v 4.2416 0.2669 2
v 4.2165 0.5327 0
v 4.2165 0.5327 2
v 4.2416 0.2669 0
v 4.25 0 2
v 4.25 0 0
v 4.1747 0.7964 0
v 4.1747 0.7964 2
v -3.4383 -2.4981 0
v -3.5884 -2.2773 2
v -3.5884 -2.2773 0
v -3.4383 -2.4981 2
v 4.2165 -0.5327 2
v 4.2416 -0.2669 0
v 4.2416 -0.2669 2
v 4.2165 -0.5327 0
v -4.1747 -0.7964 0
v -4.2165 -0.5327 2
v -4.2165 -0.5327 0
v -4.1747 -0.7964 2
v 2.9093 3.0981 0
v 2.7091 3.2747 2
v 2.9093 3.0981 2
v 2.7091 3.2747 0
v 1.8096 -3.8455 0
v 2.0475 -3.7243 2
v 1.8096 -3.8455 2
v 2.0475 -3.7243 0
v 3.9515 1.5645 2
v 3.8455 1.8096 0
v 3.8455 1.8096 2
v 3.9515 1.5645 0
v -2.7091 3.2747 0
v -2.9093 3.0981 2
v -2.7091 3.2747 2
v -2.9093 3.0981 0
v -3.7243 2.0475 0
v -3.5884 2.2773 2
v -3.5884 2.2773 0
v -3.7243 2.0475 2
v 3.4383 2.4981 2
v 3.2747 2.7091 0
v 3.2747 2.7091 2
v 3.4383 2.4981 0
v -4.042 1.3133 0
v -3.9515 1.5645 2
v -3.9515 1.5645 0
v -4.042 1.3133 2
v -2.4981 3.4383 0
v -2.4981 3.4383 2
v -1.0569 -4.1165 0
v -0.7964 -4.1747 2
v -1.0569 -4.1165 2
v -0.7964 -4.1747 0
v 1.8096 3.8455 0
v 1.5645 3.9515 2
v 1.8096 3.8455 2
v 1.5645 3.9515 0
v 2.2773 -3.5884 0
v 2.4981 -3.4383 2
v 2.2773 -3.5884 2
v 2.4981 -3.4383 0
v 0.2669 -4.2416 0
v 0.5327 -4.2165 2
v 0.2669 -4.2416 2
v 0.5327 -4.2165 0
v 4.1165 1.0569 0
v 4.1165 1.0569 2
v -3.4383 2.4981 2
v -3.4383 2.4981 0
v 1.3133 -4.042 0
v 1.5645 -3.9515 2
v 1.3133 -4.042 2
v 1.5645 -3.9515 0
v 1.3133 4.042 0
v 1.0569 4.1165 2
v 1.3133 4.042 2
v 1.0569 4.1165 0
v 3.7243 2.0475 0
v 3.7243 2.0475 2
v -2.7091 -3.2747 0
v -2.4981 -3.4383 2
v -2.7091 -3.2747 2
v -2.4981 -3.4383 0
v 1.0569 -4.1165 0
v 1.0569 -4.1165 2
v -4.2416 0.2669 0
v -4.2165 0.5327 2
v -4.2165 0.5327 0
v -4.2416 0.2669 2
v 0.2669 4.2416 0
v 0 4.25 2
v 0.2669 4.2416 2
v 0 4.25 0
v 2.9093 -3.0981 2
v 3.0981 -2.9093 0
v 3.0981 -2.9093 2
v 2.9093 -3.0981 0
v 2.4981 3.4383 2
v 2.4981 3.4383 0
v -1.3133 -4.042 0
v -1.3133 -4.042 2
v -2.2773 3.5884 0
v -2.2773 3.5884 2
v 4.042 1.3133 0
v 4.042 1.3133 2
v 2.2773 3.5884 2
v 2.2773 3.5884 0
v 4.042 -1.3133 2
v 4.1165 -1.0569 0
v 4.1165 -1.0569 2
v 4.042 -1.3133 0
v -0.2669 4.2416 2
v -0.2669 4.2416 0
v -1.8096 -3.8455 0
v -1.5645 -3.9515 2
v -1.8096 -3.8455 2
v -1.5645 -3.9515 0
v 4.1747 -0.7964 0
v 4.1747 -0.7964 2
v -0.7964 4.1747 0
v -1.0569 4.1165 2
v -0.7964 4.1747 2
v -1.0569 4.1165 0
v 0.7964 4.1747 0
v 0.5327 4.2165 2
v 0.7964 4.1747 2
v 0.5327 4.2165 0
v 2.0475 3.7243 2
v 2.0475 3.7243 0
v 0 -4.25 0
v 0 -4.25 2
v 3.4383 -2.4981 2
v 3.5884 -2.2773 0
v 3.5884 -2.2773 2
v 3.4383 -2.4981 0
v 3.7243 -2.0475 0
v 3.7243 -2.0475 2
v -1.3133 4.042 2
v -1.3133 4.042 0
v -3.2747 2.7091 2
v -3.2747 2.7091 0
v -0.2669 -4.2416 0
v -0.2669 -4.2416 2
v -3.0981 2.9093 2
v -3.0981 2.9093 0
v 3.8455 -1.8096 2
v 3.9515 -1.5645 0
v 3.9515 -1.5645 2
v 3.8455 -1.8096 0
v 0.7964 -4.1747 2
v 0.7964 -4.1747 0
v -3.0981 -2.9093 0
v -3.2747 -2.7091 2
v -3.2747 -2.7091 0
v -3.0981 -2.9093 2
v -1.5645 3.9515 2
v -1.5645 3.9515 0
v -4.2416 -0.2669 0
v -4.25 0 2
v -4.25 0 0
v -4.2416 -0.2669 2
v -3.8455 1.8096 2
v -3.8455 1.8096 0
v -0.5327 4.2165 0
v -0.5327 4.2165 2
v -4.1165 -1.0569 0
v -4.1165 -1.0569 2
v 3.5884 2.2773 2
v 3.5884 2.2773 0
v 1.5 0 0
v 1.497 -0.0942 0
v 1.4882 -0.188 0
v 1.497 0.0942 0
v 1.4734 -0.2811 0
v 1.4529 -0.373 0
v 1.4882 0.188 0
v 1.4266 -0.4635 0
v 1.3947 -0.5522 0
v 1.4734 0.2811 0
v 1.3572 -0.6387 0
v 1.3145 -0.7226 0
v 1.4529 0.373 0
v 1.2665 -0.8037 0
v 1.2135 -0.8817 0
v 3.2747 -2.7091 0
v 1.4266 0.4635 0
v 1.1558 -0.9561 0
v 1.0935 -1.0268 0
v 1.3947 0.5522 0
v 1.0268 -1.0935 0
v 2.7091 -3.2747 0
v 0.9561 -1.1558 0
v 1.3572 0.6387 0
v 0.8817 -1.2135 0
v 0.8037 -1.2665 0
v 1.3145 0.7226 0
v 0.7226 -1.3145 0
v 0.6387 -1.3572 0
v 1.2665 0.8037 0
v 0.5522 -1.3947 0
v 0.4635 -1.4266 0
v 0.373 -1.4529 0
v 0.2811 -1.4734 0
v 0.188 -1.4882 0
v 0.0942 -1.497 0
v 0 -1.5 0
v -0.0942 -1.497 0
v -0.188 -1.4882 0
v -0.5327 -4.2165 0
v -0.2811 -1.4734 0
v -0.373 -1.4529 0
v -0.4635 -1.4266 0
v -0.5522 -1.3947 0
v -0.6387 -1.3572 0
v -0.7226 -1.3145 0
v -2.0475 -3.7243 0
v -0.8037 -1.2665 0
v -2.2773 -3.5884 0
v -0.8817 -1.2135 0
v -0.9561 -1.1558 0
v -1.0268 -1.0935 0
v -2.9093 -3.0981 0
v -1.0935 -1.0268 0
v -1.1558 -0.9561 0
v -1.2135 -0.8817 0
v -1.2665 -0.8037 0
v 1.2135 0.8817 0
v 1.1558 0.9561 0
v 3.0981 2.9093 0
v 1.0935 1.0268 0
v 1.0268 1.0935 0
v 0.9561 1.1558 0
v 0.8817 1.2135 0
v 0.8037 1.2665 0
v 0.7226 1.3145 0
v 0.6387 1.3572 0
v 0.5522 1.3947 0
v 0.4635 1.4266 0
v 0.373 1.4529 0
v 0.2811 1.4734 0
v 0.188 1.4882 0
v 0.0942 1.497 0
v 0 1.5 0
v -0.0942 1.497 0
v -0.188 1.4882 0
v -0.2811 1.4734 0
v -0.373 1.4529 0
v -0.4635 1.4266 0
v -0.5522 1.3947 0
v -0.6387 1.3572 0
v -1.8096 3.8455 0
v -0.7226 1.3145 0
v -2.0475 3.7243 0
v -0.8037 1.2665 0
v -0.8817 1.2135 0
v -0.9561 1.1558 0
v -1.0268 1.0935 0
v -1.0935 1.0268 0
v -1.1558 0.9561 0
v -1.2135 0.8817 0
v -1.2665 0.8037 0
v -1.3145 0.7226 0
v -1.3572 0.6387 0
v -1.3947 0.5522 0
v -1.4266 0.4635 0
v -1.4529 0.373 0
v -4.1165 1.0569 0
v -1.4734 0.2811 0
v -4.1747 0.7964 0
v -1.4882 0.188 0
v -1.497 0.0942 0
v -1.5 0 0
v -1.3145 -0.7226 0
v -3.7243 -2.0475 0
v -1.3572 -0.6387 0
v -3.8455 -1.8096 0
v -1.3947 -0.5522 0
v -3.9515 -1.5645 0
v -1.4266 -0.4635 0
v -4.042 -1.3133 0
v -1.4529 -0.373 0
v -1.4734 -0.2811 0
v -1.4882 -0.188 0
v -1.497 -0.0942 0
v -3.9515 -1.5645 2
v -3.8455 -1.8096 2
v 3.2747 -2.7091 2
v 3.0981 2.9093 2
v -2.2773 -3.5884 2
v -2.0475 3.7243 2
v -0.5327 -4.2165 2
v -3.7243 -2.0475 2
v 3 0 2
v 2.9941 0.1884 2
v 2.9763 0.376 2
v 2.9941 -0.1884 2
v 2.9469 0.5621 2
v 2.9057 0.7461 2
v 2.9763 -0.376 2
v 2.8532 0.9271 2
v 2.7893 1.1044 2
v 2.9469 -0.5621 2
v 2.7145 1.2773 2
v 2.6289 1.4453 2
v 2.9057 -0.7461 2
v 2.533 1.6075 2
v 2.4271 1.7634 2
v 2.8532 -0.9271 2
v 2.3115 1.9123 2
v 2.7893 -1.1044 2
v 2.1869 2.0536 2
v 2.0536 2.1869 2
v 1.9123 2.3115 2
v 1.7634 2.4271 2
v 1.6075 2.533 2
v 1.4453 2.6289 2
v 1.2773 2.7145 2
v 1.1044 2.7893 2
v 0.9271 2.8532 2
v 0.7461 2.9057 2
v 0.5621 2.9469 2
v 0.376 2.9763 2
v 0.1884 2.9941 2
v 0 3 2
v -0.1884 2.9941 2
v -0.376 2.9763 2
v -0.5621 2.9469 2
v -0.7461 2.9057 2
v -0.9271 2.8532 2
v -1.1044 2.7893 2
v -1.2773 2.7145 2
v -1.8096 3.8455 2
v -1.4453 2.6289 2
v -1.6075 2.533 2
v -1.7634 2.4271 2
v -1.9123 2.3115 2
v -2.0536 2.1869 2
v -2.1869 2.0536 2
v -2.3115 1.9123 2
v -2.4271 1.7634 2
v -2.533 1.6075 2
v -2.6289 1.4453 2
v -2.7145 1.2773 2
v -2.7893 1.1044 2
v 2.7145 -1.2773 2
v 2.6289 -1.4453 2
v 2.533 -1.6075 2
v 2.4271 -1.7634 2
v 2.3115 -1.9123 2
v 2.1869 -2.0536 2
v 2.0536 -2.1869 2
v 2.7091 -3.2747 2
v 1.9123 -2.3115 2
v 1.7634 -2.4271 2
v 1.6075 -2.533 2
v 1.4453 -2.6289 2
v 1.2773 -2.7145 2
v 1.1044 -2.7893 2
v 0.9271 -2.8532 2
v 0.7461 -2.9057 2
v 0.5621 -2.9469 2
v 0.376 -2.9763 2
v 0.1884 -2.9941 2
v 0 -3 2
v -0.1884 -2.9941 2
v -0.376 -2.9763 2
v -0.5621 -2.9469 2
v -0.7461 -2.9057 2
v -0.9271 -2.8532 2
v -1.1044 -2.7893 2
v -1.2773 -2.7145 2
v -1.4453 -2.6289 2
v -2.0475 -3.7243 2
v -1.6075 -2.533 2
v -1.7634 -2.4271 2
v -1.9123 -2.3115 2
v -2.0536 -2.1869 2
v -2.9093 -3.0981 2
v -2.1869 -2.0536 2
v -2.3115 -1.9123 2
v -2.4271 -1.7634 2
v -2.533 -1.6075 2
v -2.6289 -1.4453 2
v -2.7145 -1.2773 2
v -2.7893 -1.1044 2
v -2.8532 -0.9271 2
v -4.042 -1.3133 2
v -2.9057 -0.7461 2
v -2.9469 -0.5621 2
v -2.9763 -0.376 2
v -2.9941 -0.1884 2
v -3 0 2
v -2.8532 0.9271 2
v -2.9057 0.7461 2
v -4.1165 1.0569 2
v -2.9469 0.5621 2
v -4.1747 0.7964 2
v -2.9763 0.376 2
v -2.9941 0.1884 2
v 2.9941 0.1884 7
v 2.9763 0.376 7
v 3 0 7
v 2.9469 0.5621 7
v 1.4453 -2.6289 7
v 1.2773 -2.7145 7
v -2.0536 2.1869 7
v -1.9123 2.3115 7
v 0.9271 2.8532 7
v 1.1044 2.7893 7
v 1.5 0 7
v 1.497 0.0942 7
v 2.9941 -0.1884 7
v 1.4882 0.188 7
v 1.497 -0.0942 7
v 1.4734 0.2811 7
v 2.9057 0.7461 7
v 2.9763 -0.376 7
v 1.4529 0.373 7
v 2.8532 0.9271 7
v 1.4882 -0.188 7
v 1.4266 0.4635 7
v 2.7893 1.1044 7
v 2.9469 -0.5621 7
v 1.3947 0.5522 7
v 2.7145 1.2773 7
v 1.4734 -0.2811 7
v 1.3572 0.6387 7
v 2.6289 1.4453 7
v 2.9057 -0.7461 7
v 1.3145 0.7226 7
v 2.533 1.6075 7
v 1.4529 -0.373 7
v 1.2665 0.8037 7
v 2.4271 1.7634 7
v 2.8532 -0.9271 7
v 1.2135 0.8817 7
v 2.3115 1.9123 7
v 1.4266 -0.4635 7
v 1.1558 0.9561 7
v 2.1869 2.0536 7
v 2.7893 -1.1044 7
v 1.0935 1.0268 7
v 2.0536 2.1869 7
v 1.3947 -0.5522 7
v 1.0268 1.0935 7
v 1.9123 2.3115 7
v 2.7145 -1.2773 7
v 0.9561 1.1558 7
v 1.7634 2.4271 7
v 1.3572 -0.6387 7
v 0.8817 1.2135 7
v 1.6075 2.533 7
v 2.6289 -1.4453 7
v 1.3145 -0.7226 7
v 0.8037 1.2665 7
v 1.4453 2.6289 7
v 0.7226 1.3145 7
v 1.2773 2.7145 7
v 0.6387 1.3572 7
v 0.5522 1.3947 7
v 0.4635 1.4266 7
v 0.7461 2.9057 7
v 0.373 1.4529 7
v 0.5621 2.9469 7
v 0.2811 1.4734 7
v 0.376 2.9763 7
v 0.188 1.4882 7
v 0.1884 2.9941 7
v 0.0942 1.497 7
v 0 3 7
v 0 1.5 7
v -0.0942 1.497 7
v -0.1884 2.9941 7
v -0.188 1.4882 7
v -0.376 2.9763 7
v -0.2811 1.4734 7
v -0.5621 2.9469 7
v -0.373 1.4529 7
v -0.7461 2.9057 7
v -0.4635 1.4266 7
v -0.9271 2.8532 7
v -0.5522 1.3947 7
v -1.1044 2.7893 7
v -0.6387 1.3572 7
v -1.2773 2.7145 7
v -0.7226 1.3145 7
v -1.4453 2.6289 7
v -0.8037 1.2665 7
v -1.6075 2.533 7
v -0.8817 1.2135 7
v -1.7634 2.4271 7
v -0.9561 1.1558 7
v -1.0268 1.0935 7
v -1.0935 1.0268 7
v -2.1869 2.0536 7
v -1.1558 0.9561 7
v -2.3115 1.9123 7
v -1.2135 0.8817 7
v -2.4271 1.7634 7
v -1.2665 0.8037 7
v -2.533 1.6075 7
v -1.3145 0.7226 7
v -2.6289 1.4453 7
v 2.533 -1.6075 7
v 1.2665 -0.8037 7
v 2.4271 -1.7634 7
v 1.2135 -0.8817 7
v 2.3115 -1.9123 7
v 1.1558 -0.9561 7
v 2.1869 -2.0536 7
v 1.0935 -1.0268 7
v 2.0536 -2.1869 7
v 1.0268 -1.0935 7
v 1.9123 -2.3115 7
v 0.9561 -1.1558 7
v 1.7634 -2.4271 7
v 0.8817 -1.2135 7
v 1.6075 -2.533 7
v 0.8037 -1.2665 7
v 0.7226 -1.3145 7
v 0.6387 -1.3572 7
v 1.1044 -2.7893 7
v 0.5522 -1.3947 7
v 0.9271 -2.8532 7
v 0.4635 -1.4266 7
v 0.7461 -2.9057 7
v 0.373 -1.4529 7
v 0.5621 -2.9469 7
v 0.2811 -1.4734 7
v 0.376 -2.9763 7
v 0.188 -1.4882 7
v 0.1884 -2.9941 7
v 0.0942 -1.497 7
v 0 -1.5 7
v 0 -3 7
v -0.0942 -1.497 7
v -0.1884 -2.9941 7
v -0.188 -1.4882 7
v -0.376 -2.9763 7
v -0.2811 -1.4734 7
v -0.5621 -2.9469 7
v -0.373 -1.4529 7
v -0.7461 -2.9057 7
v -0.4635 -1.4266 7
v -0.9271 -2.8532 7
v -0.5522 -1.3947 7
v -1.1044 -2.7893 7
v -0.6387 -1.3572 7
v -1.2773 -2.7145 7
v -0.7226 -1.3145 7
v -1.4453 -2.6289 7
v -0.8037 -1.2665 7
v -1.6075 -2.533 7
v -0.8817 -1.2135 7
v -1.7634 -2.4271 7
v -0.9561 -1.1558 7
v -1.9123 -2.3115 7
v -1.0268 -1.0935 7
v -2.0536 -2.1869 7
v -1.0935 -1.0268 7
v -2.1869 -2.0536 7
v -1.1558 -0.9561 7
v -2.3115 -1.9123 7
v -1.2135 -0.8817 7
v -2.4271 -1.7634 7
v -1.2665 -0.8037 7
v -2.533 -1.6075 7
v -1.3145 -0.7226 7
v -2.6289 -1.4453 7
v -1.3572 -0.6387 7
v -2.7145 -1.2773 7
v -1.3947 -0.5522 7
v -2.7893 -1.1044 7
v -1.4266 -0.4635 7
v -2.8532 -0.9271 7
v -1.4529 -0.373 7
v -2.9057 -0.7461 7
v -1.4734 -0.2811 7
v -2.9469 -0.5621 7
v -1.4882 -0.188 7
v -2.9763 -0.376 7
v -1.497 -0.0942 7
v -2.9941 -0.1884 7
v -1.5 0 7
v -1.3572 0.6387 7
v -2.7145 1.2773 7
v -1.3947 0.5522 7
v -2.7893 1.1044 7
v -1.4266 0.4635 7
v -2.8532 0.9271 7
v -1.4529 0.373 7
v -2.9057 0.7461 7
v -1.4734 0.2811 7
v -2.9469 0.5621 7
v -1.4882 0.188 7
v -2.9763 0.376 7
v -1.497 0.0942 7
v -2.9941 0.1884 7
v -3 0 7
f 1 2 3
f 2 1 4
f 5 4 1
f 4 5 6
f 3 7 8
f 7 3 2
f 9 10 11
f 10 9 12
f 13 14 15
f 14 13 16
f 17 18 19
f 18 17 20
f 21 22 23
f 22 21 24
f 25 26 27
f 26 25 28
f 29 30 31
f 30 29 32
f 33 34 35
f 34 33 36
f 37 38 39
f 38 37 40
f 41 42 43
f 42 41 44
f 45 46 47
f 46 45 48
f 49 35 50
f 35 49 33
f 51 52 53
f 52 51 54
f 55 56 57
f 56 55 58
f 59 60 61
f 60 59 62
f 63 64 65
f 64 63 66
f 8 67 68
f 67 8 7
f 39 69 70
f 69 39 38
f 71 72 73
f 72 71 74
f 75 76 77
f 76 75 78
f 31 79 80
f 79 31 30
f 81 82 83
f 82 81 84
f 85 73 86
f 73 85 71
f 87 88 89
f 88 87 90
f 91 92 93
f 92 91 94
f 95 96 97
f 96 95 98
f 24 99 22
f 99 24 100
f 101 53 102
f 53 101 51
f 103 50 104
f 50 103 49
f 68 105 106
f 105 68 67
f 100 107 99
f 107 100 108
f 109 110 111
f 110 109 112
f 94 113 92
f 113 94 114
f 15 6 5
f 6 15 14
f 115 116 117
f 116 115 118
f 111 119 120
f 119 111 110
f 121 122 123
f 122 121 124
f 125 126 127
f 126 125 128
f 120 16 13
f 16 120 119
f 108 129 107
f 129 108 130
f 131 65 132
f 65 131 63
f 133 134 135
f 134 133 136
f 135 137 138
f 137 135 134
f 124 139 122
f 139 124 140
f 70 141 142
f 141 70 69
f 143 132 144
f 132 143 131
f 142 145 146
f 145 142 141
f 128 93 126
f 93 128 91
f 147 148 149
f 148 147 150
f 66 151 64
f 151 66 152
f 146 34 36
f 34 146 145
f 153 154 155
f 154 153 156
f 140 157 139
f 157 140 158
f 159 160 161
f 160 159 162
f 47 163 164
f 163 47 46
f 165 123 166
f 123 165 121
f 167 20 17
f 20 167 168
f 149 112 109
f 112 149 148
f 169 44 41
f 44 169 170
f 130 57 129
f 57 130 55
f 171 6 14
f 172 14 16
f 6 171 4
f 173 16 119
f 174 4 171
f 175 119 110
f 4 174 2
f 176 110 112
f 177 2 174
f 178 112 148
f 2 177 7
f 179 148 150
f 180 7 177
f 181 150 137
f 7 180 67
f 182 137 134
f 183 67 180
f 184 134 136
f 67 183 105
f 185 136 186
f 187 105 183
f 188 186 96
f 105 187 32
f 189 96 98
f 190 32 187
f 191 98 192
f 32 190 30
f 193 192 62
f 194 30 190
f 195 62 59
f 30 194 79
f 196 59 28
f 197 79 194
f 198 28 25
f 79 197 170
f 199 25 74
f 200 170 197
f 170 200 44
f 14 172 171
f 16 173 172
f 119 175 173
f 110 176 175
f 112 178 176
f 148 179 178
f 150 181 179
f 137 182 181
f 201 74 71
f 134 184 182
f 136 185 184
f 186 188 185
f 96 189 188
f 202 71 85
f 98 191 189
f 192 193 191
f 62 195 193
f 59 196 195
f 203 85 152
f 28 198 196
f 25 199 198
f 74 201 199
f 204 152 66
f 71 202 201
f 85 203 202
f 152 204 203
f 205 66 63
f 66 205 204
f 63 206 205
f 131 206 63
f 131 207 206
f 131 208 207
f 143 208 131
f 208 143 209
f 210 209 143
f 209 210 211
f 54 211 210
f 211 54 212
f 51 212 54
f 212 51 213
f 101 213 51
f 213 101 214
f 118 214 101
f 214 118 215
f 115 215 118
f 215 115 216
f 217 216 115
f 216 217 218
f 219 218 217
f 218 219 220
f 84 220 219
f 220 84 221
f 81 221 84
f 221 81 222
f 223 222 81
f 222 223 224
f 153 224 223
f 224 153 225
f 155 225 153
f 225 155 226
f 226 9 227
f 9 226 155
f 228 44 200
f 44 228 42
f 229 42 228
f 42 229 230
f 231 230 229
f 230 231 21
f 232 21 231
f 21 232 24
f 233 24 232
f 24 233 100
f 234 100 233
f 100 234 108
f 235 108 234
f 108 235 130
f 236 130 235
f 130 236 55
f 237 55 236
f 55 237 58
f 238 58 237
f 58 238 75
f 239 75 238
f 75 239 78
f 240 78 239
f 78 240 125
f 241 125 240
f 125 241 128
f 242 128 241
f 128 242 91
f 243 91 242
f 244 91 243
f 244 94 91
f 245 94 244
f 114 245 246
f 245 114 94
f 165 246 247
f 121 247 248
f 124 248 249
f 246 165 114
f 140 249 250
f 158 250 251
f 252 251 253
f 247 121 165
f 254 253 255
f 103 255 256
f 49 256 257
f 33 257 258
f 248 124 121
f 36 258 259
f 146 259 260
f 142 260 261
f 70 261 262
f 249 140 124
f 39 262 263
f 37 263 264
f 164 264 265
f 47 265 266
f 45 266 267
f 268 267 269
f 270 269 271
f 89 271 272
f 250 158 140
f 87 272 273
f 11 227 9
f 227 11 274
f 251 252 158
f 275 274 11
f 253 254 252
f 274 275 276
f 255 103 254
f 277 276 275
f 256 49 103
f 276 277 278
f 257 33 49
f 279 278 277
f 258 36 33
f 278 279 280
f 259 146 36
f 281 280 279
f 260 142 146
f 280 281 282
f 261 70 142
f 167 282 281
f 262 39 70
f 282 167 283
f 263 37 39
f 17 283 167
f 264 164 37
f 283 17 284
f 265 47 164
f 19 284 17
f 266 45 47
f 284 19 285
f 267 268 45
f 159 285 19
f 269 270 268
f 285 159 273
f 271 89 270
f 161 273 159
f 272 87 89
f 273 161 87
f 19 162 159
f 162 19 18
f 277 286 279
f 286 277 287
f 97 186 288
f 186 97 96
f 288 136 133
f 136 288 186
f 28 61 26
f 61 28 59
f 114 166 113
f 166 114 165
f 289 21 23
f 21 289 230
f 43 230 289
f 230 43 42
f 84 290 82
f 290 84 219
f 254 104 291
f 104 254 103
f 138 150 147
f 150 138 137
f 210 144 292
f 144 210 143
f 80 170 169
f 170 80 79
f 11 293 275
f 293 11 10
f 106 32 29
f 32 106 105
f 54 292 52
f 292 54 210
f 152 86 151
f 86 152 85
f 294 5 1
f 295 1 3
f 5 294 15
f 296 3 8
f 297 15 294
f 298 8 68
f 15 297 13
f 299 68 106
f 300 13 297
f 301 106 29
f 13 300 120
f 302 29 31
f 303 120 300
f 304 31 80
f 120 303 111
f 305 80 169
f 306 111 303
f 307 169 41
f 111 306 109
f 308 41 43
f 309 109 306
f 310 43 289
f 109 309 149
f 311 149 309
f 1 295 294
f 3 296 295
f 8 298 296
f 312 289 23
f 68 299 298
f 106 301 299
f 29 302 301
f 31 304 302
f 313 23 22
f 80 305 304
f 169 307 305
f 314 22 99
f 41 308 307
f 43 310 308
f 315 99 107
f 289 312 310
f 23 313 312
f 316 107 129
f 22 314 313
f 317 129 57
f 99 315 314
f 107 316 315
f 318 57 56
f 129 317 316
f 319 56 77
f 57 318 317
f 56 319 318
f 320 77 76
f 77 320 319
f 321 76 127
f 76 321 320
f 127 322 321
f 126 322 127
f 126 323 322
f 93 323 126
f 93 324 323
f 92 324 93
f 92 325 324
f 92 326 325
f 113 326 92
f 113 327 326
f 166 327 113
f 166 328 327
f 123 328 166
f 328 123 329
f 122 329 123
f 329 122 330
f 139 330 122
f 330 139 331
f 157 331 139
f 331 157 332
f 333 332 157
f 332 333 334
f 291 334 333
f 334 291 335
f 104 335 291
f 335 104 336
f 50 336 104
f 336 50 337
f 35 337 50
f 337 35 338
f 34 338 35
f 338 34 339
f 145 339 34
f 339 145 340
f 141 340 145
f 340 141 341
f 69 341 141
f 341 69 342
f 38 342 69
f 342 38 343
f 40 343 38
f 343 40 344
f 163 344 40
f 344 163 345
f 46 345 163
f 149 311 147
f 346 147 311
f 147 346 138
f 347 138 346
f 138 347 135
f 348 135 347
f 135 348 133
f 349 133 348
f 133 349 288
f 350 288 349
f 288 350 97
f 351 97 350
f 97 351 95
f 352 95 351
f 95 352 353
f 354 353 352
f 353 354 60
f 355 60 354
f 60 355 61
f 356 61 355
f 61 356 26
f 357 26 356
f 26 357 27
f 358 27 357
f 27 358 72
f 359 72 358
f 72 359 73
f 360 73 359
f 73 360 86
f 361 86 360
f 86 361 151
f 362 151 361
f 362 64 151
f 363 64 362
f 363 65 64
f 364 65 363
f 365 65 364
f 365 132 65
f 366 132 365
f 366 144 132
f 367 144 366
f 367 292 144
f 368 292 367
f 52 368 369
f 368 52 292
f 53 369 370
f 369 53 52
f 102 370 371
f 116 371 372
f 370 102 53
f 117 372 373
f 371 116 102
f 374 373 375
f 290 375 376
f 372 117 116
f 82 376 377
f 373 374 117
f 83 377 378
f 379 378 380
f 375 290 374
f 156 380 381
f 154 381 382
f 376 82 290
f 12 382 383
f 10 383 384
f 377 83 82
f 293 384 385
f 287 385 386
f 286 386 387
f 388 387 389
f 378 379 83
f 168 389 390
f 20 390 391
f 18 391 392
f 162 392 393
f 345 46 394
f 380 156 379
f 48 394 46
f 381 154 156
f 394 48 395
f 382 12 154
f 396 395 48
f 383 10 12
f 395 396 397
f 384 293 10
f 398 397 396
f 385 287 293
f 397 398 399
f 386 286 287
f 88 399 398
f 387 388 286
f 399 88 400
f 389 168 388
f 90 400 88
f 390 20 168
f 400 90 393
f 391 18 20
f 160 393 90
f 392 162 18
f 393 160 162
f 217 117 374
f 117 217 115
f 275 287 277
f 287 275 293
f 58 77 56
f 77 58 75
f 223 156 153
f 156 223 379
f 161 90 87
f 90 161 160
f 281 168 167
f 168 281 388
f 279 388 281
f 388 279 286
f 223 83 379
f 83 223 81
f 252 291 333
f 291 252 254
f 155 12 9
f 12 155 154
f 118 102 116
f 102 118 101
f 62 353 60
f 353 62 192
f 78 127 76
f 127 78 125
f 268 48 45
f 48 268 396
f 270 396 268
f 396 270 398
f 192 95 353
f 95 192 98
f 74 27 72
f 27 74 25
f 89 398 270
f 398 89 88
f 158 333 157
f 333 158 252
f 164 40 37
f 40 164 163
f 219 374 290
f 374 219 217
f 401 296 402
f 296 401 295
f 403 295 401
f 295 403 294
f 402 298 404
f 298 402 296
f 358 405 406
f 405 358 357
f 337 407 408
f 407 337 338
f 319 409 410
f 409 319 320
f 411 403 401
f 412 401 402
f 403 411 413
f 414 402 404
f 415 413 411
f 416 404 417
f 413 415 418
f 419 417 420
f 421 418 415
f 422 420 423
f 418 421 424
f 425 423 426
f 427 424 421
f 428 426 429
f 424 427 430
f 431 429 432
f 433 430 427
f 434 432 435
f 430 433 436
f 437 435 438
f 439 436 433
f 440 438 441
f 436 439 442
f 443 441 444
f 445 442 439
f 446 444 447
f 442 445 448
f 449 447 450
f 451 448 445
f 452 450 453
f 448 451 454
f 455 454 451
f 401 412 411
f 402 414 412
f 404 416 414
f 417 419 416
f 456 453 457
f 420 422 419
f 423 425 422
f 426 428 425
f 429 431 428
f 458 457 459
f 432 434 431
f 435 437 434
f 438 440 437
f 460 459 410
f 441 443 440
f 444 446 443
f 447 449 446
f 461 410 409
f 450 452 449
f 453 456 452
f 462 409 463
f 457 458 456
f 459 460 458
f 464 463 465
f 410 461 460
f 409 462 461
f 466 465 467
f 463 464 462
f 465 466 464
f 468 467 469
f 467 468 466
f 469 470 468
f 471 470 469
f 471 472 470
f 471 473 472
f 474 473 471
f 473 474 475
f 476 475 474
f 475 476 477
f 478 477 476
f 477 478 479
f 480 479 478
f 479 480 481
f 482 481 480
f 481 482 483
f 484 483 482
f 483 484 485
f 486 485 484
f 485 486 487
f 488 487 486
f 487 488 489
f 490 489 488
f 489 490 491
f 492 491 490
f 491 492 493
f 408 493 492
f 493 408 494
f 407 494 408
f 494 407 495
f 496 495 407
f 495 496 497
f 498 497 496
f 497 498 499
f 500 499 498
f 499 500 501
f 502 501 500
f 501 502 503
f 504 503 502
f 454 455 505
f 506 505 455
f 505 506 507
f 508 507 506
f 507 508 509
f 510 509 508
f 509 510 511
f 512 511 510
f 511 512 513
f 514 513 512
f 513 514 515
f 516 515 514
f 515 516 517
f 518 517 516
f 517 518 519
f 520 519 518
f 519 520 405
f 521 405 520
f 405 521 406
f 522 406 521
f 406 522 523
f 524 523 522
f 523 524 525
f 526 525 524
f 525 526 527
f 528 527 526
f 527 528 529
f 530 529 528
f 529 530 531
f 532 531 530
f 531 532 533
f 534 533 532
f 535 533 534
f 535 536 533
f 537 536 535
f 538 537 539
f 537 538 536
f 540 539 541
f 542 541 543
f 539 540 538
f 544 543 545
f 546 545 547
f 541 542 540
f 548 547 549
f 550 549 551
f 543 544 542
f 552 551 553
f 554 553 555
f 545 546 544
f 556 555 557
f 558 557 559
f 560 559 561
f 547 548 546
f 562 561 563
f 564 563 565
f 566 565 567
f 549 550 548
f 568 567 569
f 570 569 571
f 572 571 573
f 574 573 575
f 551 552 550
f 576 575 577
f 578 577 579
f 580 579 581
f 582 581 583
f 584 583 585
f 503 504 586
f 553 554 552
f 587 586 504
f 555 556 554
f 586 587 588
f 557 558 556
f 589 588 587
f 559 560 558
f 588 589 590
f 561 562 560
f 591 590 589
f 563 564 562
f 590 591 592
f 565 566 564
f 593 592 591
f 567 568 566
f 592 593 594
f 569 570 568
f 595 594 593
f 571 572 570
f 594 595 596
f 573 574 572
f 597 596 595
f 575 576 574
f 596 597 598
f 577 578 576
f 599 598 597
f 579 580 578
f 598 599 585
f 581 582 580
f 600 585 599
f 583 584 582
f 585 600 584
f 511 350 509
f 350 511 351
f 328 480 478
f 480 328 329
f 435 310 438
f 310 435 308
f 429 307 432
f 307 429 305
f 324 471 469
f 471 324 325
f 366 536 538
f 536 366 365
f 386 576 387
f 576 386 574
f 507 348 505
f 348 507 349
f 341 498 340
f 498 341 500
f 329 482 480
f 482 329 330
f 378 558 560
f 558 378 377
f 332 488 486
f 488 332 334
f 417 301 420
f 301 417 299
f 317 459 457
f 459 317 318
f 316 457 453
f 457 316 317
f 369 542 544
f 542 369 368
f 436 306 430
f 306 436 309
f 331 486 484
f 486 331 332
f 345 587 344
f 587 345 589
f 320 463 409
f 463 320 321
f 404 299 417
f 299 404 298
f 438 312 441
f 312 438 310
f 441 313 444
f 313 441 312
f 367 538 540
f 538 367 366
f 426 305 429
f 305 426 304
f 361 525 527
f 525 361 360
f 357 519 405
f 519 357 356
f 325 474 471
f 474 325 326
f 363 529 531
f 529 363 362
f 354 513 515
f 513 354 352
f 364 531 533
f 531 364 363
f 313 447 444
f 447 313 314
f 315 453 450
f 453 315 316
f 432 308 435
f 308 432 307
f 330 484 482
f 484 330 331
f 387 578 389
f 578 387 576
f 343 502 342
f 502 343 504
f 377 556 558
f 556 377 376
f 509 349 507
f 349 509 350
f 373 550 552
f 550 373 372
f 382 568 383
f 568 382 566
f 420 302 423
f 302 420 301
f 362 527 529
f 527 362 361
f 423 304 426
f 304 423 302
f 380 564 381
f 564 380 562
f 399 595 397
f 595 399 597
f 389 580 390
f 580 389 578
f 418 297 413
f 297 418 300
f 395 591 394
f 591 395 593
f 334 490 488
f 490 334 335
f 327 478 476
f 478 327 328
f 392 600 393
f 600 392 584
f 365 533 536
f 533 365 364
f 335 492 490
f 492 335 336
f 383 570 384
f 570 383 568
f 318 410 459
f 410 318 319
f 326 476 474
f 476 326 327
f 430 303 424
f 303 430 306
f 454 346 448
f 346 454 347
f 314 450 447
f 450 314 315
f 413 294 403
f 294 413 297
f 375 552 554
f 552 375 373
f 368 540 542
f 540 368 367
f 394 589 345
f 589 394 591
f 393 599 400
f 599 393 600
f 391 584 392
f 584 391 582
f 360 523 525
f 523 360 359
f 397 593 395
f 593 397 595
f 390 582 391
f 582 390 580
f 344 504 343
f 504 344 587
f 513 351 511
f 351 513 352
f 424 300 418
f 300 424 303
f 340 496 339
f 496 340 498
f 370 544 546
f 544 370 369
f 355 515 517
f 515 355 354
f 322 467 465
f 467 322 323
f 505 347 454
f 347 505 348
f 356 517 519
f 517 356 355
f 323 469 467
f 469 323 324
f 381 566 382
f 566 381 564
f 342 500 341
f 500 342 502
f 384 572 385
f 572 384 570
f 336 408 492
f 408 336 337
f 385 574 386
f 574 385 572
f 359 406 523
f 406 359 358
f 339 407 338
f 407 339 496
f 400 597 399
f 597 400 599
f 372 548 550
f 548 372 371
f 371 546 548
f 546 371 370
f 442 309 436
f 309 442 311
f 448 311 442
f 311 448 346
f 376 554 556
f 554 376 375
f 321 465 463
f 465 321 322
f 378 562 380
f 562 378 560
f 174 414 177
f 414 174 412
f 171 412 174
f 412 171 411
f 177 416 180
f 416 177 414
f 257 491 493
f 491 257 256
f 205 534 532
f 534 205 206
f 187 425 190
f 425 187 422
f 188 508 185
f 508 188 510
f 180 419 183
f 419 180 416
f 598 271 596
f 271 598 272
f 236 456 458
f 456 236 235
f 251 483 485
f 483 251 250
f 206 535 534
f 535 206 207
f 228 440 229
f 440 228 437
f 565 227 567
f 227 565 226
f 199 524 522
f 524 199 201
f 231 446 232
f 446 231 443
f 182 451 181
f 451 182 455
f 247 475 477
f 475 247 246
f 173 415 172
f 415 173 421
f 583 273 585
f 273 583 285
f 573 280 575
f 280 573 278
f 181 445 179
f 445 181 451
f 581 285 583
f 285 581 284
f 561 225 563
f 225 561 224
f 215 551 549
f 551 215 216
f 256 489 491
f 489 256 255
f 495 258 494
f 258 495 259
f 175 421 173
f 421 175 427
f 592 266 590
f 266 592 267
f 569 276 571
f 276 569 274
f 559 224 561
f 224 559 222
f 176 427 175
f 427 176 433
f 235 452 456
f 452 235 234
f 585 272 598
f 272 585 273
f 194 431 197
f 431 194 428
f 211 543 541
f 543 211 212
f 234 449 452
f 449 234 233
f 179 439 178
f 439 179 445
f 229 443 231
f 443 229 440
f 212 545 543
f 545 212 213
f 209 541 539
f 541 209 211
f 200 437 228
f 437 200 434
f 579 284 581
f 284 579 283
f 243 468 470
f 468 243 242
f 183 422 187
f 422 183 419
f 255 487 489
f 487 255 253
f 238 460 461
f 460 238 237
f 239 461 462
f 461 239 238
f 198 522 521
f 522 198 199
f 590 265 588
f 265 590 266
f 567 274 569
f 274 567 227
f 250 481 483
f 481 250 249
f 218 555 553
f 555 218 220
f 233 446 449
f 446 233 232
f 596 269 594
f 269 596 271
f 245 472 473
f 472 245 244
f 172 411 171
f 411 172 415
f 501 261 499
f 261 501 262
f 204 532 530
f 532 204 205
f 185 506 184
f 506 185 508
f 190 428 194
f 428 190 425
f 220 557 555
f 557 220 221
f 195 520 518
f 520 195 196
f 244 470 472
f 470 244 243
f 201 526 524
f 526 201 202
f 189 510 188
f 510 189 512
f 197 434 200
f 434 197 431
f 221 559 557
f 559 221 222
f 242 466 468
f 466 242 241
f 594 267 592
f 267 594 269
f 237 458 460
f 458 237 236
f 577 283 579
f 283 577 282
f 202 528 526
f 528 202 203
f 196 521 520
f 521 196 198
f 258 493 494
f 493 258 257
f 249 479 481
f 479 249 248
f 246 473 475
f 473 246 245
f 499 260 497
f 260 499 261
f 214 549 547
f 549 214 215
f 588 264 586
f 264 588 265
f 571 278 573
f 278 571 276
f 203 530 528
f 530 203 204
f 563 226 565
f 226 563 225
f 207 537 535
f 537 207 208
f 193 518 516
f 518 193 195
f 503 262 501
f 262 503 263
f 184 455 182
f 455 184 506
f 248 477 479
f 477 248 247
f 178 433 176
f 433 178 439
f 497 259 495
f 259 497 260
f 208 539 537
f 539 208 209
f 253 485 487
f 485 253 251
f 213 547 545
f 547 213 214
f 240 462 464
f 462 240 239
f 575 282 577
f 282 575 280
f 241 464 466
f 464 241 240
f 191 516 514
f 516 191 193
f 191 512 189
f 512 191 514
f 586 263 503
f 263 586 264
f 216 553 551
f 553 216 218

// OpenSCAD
width = 7;       // Overall width
spacerD = 8.5;   // Diameter of spacer
spacerW = 2;     // Width of spacer
bearing = 6;     // Internal Diameter of bearing
bolt = 3;        // Diameter of bolt

$fn=100;         // set number of faces

difference () {
    union() {
        cylinder(r=spacerD/2, h=spacerW);
        cylinder(r=bearing/2, h=width);
    }
    translate([0,0,-1]) cylinder(r=bolt/2, h=width+2);
}
